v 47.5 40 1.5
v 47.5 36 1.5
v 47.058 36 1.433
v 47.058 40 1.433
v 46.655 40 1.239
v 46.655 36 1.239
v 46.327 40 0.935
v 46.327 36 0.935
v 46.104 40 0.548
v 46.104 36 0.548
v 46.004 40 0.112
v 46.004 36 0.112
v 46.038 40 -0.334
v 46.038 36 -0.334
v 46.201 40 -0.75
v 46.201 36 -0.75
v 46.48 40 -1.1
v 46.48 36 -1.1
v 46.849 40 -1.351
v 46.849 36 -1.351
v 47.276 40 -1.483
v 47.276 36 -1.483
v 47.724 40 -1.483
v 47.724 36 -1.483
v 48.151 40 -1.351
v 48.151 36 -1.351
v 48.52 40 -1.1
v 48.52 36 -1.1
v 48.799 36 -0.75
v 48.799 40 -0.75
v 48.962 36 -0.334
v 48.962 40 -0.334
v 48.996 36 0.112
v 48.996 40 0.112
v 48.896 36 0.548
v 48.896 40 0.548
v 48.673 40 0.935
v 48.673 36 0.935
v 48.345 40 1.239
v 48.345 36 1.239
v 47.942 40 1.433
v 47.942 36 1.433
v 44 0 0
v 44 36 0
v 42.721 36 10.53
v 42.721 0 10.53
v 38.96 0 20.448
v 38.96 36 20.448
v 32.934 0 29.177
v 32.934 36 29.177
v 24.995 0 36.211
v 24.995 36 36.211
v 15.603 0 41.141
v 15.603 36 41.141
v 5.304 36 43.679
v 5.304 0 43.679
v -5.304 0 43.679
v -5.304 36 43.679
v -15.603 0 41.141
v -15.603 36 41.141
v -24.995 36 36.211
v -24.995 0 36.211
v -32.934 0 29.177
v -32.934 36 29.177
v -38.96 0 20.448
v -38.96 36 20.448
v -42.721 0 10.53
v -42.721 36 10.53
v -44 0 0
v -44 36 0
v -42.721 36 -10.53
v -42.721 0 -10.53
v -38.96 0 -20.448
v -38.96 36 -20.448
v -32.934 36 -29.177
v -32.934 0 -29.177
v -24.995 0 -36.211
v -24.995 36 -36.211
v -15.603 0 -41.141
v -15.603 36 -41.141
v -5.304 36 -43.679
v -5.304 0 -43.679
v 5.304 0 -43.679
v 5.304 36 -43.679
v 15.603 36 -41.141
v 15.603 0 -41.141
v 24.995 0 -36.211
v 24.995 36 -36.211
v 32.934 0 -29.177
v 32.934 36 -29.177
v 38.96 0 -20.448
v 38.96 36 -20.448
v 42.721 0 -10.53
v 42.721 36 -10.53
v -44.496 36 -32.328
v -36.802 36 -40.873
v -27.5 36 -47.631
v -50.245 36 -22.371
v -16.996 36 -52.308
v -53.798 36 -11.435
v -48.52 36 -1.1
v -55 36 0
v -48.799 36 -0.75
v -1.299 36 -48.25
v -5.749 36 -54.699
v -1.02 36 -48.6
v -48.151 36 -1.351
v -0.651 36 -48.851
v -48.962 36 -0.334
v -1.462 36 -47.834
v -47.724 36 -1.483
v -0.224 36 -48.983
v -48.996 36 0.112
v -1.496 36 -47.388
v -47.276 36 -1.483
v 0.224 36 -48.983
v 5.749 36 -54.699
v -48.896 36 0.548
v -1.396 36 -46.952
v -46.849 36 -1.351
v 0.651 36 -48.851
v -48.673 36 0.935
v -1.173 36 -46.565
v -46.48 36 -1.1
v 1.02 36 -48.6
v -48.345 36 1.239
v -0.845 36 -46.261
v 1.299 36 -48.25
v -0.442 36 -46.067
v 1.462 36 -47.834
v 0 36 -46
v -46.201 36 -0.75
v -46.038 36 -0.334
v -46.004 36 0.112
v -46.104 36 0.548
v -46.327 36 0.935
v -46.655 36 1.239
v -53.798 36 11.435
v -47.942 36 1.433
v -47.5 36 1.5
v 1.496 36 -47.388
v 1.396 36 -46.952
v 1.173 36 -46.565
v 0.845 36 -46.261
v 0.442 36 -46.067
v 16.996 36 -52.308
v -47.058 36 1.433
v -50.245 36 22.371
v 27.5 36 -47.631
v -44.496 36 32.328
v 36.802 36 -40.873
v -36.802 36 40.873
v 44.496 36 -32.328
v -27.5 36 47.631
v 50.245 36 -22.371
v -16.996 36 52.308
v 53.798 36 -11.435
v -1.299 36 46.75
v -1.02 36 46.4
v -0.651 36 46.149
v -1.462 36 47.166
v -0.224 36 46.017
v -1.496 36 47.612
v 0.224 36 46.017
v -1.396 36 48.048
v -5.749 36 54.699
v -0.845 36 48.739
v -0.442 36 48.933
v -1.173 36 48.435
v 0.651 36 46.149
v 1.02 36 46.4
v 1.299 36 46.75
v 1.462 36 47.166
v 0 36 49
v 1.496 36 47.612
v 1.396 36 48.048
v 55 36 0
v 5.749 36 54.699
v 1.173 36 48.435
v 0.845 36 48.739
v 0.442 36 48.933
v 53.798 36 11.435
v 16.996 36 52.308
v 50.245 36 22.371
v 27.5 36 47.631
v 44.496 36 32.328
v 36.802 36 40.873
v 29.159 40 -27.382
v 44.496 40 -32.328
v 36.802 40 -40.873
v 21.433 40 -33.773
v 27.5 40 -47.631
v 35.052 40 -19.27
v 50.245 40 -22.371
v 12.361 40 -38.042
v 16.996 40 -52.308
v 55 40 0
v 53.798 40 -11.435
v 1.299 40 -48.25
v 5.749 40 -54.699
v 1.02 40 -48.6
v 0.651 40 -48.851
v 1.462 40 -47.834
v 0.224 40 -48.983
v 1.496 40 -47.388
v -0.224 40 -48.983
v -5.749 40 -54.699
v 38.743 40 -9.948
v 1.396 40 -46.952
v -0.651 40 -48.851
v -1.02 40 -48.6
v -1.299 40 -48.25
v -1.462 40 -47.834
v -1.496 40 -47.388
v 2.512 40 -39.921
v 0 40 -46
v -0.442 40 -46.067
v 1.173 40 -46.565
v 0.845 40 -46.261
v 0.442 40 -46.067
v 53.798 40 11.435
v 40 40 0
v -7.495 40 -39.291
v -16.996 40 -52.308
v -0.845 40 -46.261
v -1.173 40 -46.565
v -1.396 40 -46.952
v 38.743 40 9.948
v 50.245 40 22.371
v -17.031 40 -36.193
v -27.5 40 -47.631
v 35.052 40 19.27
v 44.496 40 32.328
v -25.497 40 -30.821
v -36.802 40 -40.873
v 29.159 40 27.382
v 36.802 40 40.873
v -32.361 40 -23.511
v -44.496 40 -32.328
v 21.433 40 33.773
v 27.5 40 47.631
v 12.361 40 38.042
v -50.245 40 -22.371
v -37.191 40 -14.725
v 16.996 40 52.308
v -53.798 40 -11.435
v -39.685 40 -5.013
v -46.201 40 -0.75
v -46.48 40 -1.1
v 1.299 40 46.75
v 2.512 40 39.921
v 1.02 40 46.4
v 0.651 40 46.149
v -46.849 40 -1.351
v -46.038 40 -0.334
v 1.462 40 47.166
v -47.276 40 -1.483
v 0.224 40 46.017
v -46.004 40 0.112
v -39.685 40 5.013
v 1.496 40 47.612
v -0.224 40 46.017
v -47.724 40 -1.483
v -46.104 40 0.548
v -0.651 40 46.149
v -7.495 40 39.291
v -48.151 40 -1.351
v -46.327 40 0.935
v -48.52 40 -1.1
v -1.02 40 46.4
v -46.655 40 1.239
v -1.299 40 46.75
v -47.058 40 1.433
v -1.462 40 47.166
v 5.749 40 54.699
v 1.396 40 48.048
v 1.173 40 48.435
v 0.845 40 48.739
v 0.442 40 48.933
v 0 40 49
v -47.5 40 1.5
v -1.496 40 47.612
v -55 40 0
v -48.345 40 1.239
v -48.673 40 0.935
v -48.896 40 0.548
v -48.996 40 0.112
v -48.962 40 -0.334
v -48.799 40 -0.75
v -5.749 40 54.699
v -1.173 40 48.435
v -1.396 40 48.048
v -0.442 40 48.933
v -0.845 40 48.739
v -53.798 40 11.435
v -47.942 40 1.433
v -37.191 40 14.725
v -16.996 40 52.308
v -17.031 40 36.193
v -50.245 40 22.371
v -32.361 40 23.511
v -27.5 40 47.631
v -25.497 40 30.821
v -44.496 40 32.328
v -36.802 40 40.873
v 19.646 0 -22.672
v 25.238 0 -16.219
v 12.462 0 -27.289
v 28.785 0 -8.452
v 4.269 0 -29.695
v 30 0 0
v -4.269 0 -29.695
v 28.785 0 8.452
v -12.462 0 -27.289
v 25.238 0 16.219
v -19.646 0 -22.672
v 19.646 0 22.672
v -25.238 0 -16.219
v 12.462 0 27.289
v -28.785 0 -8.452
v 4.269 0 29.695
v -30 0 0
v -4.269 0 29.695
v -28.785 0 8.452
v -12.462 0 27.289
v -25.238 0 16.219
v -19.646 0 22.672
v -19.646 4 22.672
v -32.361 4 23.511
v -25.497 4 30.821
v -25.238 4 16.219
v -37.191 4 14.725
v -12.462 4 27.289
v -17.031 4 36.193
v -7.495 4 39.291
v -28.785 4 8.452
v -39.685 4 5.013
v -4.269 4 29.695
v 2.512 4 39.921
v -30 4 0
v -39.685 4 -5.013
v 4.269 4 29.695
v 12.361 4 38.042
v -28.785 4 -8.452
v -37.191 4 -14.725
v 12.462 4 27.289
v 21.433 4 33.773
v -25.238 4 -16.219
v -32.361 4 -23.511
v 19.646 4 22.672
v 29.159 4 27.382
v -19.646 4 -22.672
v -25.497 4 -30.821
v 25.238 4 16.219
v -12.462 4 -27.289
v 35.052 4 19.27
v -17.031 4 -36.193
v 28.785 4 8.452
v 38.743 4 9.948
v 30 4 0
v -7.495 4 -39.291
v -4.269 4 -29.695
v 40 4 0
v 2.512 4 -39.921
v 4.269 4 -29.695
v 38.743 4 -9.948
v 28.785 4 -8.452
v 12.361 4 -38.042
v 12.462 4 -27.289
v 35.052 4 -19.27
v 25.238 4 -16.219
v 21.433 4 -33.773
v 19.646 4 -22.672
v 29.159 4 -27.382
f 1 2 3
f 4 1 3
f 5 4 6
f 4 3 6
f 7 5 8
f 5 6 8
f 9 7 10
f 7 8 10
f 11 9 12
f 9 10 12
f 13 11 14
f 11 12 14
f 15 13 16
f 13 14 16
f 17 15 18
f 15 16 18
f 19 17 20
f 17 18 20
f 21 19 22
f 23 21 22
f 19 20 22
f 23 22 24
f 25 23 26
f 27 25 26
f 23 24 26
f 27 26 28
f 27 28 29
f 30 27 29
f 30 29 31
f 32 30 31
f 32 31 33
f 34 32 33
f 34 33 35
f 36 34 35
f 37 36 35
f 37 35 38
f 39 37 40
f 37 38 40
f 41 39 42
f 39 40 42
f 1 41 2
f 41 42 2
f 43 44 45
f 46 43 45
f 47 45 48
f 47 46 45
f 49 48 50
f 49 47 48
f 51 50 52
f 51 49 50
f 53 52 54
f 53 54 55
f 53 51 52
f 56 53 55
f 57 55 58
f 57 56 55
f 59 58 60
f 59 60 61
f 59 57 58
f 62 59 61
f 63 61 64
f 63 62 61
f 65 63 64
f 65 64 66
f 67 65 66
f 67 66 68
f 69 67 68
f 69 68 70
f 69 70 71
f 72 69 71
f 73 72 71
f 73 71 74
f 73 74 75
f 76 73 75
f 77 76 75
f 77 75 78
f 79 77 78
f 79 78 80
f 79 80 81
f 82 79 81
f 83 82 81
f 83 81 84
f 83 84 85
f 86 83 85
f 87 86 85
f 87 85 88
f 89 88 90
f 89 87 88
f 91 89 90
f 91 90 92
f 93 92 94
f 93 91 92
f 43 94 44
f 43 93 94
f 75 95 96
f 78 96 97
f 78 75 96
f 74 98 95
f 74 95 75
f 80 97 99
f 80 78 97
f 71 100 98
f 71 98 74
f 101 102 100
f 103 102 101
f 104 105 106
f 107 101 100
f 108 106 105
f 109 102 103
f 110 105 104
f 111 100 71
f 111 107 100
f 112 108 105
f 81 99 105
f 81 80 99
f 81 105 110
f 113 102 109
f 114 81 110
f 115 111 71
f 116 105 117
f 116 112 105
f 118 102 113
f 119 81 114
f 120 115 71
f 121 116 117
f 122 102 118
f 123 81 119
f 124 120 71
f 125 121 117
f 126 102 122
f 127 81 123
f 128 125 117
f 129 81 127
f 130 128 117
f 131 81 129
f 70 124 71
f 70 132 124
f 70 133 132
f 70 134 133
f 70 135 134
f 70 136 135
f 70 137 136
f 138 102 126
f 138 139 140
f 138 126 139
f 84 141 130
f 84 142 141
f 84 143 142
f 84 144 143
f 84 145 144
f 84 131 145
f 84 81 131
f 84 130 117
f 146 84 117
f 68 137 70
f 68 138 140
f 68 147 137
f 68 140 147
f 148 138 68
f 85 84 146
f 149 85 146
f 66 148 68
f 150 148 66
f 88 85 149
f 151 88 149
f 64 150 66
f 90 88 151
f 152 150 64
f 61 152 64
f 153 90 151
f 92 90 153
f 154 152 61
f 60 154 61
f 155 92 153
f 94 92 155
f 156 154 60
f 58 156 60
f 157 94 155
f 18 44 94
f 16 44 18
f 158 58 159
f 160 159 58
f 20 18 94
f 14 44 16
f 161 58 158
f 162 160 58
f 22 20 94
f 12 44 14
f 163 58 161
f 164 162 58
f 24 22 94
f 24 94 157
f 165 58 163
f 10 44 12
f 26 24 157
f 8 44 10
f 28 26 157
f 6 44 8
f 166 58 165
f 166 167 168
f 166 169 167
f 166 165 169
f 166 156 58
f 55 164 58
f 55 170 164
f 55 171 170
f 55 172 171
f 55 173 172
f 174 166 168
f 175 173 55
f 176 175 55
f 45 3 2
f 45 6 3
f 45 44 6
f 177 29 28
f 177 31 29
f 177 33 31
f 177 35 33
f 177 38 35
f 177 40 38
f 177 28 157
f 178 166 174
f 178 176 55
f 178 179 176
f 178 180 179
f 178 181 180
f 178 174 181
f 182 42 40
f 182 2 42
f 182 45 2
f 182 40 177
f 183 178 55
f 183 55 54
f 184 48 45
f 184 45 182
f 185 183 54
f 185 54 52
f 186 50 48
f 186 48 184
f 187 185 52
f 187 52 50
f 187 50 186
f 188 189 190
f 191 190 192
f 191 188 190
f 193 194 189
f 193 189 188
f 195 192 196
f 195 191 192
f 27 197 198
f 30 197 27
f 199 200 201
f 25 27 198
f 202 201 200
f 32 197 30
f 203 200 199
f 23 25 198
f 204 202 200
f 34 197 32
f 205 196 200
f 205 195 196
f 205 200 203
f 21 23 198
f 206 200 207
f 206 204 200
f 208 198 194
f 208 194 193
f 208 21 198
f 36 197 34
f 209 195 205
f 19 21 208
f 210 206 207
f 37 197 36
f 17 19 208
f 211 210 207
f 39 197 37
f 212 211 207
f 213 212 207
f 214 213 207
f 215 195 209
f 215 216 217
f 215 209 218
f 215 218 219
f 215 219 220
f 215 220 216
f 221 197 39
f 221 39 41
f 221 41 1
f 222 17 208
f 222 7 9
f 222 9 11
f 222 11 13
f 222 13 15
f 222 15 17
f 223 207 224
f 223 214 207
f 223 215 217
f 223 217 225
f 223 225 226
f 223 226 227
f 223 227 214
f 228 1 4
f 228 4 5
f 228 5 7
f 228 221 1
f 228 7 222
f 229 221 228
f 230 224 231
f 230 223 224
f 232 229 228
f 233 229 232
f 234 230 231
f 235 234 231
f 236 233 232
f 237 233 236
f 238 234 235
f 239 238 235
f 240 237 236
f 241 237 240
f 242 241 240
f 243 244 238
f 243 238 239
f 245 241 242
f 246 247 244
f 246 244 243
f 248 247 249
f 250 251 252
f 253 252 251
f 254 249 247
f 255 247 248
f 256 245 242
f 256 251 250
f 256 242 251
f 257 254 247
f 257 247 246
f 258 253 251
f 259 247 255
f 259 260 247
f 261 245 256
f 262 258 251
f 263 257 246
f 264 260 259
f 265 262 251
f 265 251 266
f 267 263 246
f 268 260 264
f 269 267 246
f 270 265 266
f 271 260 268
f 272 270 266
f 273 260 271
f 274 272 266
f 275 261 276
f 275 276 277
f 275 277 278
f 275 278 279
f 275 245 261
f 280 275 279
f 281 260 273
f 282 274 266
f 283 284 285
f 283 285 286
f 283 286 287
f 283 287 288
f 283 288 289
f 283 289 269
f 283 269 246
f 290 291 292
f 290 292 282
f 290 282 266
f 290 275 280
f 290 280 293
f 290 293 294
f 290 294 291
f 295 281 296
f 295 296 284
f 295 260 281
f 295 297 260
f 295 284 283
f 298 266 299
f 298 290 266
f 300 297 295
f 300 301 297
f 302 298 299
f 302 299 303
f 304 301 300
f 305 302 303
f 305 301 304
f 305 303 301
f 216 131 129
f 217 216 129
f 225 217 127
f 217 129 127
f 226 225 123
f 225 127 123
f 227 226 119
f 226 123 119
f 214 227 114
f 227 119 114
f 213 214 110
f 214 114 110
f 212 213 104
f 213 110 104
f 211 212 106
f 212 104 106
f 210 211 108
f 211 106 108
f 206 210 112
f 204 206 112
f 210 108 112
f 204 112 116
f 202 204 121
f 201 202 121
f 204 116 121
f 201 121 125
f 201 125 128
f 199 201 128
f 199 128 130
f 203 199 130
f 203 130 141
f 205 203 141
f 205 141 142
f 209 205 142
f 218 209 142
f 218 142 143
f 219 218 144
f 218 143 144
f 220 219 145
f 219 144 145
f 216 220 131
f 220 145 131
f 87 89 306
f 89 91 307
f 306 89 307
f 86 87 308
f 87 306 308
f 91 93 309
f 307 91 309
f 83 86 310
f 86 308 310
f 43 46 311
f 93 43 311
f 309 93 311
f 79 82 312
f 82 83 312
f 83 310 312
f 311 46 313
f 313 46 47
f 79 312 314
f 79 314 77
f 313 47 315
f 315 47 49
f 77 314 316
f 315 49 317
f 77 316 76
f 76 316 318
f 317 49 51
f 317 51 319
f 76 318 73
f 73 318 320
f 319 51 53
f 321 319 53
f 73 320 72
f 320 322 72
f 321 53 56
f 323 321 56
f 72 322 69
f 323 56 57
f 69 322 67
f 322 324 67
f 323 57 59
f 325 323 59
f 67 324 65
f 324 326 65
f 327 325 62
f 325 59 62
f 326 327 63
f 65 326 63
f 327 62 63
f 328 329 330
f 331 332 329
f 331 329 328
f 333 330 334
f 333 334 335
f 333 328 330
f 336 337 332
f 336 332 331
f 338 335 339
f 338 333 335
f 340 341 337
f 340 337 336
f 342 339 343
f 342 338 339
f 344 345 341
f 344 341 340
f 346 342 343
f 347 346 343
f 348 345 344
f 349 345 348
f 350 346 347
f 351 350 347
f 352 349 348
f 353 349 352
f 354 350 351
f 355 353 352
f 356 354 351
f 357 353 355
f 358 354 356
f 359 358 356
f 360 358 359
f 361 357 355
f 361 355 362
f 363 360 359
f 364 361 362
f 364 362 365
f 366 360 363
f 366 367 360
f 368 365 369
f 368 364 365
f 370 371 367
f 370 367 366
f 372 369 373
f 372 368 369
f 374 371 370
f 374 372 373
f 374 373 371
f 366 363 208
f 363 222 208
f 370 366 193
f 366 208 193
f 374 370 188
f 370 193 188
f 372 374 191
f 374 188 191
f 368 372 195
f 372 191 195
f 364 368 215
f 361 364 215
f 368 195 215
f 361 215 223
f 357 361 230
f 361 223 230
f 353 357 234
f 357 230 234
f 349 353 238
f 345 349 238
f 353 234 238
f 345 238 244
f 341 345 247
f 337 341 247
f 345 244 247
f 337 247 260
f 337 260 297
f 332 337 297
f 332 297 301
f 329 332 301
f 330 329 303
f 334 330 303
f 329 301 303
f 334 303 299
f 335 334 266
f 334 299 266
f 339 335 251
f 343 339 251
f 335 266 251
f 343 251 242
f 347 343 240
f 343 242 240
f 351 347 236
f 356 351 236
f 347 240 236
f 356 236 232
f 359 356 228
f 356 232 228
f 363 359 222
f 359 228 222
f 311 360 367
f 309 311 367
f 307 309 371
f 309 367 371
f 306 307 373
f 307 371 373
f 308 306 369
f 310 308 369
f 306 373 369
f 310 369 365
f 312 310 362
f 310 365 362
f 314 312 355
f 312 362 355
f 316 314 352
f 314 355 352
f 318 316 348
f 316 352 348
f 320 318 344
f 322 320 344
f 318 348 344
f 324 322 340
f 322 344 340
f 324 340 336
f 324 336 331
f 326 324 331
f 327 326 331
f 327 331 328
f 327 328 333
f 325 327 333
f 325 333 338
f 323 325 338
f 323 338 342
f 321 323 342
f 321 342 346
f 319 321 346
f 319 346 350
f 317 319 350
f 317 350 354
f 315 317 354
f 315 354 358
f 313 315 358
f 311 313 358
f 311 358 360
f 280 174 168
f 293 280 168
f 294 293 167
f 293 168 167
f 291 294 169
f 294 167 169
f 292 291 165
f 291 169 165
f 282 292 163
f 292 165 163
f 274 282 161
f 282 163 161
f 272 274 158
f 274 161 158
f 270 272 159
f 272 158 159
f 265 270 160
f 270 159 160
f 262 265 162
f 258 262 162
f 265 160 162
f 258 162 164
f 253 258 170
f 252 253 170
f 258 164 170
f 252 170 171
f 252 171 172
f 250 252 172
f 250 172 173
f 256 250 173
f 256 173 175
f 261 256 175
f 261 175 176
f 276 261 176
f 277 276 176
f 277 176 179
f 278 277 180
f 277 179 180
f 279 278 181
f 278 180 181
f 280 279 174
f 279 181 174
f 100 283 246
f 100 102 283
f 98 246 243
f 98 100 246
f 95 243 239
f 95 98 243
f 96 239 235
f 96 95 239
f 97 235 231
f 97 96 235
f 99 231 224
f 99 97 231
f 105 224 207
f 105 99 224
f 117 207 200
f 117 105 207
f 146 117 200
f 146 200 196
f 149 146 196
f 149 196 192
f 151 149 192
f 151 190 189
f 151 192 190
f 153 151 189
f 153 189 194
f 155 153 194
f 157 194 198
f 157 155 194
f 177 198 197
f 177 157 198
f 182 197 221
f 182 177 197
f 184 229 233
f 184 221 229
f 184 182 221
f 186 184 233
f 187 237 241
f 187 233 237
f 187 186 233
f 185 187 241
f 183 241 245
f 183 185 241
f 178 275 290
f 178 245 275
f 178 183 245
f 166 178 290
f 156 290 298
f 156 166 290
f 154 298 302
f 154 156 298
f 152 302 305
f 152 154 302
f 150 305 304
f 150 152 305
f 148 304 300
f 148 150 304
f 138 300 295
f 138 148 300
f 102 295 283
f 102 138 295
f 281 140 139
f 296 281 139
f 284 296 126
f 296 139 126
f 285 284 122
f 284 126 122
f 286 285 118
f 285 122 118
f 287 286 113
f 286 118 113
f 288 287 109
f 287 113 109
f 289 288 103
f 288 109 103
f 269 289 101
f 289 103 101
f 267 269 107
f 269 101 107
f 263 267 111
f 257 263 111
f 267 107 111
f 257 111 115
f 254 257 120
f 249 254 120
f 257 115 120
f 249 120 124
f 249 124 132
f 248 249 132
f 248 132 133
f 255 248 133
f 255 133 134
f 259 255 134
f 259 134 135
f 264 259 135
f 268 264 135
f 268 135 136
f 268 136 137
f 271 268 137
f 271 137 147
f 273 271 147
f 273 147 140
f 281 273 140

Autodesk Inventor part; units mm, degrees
ref_plane "YZ Plane" through (0, 0, 0) normal (1, 0, 0) x (0, 1, 0)
ref_plane "XZ Plane" through (0, 0, 0) normal (0, 1, 0) x (-1, 0, 0)
ref_plane "XY Plane" through (0, 0, 0) normal (0, 0, 1) x (1, 0, 0)
sketch "Sketch1" plane through (0, 0, 0) normal (0, 1, 0) x (-1, 0, 0)
  circle A0 centre (0, 0) radius 55
  dimension "d0" = 110
extrude "Extrusion1" add sketch "Sketch1" along normal blind 40
sketch "Sketch2" plane through (0, 0, 0) normal (0, -1, 0) x (1, 0, 0)
  circle A0 centre (0, 0) radius 44
  circle A1 centre (0, 0) radius 55 projected
  dimension "d3" = 88
extrude "Extrusion2" cut sketch "Sketch2" against normal blind 36
sketch "Sketch3" plane through (0, 40, 0) normal (0, 1, 0) x (1, 0, 0)
  circle A0 centre (0, 0) radius 30
  dimension "d6" = 60
extrude "Extrusion3" cut sketch "Sketch3" against normal through all
sketch "Sketch4" plane through (0, 40, 0) normal (0, 1, 0) x (1, 0, 0)
  circle A0 centre (0, 0) radius 40
  dimension "d9" = 80
extrude "Extrusion4" cut sketch "Sketch4" against normal blind 36
sketch "Sketch5" plane through (0, 40, 0) normal (0, 1, 0) x (1, 0, 0)
  circle A0 centre (0, 0) radius 47.5
  circle A1 centre (0, 47.5) radius 2
  circle A2 centre (-47.5, 0) radius 2
  circle A3 centre (0, -47.5) radius 2
  circle A4 centre (47.5, 0) radius 2
  dimension "d12" = 95
  dimension "d13" = 4
  dimension "d16" = 360
hole "Hole1" at (-47.5, 40, 0) at (0, 40, 47.5) at (47.5, 40, 0) at (0, 40, -47.5) direction (0, -1, 0) diameter 3 end through all
thread "Thread1" size "M3x0.5" class "6H" standard "ANSI Metric M Profile" full length
thread "Thread2" size "M3x0.5" class "6H" standard "ANSI Metric M Profile" full length
thread "Thread3" size "M3x0.5" class "6H" standard "ANSI Metric M Profile" full length
thread "Thread4" size "M3x0.5" class "6H" standard "ANSI Metric M Profile" full length
properties part number "sensor1_lock" material "Aluminum 6061"
